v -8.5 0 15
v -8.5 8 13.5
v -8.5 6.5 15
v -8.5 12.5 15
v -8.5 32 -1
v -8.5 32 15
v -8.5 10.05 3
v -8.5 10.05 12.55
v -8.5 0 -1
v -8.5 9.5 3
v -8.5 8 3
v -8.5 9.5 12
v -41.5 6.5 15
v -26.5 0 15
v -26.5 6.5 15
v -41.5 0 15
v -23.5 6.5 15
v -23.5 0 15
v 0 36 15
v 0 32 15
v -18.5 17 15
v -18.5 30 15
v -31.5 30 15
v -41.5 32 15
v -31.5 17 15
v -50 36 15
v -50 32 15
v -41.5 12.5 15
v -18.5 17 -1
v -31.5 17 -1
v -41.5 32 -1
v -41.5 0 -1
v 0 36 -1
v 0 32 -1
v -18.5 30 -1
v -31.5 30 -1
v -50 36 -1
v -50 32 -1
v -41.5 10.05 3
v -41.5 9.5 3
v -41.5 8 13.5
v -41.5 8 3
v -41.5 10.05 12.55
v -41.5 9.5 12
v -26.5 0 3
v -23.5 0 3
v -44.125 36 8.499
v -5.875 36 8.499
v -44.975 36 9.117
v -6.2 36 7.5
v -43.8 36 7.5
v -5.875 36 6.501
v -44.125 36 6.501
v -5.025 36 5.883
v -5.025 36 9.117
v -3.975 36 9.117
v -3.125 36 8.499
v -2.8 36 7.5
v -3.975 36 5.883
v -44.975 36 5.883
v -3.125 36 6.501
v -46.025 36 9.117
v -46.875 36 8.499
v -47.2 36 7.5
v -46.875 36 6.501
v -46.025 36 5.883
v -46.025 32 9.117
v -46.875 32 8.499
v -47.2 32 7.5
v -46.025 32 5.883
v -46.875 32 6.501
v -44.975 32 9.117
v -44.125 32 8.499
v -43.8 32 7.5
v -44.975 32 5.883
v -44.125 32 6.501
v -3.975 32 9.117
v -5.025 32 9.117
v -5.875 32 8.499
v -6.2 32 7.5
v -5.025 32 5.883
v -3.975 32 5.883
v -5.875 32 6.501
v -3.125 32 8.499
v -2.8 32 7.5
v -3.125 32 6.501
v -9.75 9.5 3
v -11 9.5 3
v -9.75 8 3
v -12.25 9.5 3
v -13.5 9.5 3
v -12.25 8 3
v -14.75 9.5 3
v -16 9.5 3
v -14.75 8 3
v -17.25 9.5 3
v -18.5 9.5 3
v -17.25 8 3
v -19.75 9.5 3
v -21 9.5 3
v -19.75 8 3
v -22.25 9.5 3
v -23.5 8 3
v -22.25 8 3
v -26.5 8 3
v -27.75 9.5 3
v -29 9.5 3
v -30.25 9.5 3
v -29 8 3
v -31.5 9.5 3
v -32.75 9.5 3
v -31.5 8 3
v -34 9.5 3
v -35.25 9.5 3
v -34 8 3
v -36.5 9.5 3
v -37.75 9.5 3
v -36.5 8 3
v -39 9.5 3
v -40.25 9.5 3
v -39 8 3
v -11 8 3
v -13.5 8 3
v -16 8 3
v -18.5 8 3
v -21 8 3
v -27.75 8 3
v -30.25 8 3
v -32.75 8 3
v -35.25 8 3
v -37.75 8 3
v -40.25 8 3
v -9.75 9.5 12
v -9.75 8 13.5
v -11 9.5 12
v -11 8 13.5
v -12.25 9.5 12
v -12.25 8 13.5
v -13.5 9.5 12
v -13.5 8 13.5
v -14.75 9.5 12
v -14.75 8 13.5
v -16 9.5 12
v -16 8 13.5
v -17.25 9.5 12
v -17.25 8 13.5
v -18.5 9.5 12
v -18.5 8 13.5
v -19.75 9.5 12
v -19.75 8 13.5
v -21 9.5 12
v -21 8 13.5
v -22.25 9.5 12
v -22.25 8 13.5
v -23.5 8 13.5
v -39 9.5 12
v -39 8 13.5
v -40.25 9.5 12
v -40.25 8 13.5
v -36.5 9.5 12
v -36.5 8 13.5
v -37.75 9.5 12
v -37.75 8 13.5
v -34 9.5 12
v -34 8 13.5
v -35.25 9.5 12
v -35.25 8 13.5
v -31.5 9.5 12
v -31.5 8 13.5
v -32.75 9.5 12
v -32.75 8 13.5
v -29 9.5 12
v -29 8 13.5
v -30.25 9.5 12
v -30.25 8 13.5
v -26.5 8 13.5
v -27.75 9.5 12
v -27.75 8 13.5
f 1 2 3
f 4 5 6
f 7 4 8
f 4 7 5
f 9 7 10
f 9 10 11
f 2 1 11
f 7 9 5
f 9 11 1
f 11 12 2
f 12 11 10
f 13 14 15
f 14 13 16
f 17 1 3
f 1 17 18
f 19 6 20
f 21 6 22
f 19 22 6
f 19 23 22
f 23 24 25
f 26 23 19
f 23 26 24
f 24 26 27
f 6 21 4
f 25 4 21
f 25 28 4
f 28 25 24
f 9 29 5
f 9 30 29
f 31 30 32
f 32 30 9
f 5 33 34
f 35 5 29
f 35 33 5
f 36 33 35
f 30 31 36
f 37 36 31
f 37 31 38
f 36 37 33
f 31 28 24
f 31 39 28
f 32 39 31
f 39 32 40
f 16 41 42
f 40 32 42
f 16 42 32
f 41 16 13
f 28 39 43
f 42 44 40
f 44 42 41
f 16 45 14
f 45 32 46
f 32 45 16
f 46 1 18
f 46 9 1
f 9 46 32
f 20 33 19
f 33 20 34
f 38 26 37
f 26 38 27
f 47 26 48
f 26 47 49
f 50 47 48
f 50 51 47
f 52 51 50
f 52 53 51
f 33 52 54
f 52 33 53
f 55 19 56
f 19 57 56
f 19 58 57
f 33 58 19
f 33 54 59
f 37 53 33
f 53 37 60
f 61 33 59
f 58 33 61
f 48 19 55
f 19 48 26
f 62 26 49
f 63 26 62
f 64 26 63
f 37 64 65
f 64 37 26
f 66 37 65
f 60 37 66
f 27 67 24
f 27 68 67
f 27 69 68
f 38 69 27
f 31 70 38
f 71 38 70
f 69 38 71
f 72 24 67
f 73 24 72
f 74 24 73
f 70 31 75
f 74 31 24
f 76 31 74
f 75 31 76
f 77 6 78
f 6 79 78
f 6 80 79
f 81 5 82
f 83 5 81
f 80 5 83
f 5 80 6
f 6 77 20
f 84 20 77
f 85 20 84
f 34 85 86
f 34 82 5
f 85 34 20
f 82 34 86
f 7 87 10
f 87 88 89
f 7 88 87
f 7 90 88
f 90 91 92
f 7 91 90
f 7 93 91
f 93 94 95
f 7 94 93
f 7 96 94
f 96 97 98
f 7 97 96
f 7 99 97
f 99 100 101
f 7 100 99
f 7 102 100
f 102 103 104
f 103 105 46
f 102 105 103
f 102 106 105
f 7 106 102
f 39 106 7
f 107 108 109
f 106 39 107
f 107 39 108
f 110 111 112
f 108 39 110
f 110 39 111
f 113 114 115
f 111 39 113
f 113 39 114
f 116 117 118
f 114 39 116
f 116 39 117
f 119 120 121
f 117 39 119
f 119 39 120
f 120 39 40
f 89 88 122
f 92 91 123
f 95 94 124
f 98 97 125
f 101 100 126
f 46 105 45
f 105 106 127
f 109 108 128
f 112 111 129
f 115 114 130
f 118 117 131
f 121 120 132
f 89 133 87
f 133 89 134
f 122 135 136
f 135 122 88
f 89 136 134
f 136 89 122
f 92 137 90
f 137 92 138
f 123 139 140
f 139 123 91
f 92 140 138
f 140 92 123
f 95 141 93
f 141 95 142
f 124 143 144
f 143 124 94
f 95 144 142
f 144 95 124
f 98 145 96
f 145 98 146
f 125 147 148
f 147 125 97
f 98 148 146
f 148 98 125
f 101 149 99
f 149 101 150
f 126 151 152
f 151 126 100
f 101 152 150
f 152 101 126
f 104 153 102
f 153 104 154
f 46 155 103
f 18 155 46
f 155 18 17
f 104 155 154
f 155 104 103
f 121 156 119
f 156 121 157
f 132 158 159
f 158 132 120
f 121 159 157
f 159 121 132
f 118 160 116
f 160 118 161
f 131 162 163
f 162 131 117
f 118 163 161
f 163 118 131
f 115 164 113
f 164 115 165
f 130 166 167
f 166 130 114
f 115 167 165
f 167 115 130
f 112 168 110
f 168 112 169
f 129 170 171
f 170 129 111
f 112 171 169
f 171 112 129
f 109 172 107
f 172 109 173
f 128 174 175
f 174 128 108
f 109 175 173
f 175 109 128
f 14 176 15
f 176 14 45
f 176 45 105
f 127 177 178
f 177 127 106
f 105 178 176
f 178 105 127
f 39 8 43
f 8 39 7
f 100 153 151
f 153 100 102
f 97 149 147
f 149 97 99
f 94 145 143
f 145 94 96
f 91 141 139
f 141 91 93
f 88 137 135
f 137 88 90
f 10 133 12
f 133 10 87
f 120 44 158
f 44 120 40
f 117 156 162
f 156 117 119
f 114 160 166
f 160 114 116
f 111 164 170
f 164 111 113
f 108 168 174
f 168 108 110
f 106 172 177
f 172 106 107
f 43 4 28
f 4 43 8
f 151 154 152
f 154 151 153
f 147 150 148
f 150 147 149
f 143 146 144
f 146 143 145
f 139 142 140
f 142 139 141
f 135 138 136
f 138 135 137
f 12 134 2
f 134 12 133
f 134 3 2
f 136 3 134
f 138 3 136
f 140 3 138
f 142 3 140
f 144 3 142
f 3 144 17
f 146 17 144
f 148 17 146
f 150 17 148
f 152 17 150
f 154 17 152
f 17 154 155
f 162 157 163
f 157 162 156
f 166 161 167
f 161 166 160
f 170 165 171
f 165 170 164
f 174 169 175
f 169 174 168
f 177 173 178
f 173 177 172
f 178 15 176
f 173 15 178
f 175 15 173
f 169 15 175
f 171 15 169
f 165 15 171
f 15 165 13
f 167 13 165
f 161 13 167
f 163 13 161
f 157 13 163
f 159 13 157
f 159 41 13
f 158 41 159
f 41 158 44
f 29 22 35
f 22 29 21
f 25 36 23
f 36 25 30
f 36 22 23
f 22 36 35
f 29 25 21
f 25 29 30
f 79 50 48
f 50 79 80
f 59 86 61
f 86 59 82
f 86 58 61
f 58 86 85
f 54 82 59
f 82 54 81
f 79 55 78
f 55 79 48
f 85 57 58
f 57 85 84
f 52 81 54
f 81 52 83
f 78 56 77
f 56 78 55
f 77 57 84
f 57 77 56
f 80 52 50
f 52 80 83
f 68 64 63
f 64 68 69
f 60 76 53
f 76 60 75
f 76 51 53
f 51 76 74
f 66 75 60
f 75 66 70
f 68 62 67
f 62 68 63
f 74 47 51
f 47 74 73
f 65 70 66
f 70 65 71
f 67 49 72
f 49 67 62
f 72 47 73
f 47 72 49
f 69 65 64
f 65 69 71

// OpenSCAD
// file: ../configuration.scad
// Layer high for the printing [mm]
layer_height = 0.20; //Slic3r->Print Settings->Layers and perimeters->Layer height

// Spare for the screws heads [mm]
spare = 0.75;
// M6 screw diameter [mm]
M6_head_diameter = 13.6+spare;
//M6_head_diameter = 10.6+spare;
//M6_head_diameter = 12+spare;

// M6 head high (for hiding it) [mm]
//M6_head_height = 4;
M6_head_height = 3.6;
//M6_head_height = 4.5;

// Screws and rods diameters
M8_smooth_rod_diameter = 8.3;
M8_smooth_rod_diameter_catch = 8.4;
// Prumer 8mm tyce
rod_8mm_d = 8.2; //pro dil z-top
M6_diameter = 6.6;
M6_dia=M6_diameter; //pro dil z-top
M6_diamater_horizontal = 6.5;
M3_diameter = 3.7;
M3_diameter_horizontal = 3.5;

//matice trapézové tyče
TRAP_diameter_externa=22; //průmer vnější 


// Nuts diameters
M3_nut_diameter = 7.0;
M3_nut_diameter_horizontal = 6.7;

// ALU profile parameters
ALU_cut_width = 7.9;
ALU_cut_width_horizontal = 7.7;

// Sirka matky do profilu (pokud neni pouzita, tak 0)
//profile_nut_width = 9.5;
profile_nut_width = 0; //pro z-top

// Motors length/depth (for axes Z and Y)
//SX17-1003LQFE (recommended for the Z axis)
motor_length = 29.5;
//SX17-1003 (recommended for the Z axis)
//motor_length = 34;
//SX17-1005
//motor_length = 40;
//SX17-0905 - this motor is too high - the Z end stop holder has to be adjusted
//motor_length = 48;

// Extrusion width [mm]
extrusion_width = 0.66; //Slic3r->Print Settings->Advanced->Default extrusion width

/// Belt type ******************************************************

// GT2 
/*belt_tooth_distance = 2;
belt_tooth_ratio = 0.5;
belt_tooth_height = 1.4;
belt_thickness = 2.3;
*/

// T2.5
belt_tooth_distance = 2.5;
belt_tooth_ratio = 0.5;


// Tloustka rohovych spojek
// 5 mm => sroub M6x14 s podlozkou
// 3 mm => sroub M6x12 s podlozkou
coupler_thickness = 3;
// main file
// PRUSA iteration3
// y belt holder
// GNU GPL v3
// Josef Průša <iam@josefprusa.cz> and contributors
// http://www.reprap.org/wiki/Prusa_Mendel
// http://prusamendel.org

include <../configuration.scad>

x_size = 33;
x_offset = 8.5;
fix_teeth_count = 6;

module belt_holder_base(){
 translate([-x_size-x_offset,0,-1]) cube([x_size,35,16]);
 translate([-50,32,-1]) cube([50,4,16]); 
}

module belt_holder_beltcut(){
tooth_size = belt_tooth_ratio*belt_tooth_distance;
 echo(tooth_size);
 // Belt slit
 translate([-66,-0.5+10,3]) cube([67,0.55,15]);
 // Smooth insert cutout
 translate([-66,-0.5+10,12]) rotate([45,0,0]) cube([67,15,15]);
 // Individual teeth
    for ( i = [0 : fix_teeth_count + 1] ){
            translate([(-i*belt_tooth_distance)-x_offset,-0.5+x_offset,3]) cube([belt_tooth_ratio*belt_tooth_distance,1.7,15]);
    }
    
    for ( i = [0 : fix_teeth_count + 1] ){
            translate([i*belt_tooth_distance-tooth_size-x_offset-x_size,-0.5+x_offset,3]) cube([belt_tooth_ratio*belt_tooth_distance,1.7,15]);
    }
    
    // Middle belt opening
    left_opening_border =-x_size-x_offset+fix_teeth_count*belt_tooth_distance; 
    right_opening_border =-x_offset-fix_teeth_count*belt_tooth_distance-left_opening_border; 
    translate([left_opening_border,-1,3]) cube([right_opening_border,11,15]);	
    
    //lightenning hole
    translate([-33-8.5+10,17,-2]) cube([13,13,20]);
}

module belt_holder_holes(){
 translate([-4.5,0.1,7.5]) rotate([-90,0,0]) cylinder(h=50, r=1.7, $fn=10);
 translate([-45.5,0.1,7.5]) rotate([-90,0,0]) cylinder(h=50, r=1.7, $fn=10);
}

// Final part
module belt_holder(){
    difference(){
        belt_holder_base();
        belt_holder_beltcut();
        belt_holder_holes();
    }
}

belt_holder();
